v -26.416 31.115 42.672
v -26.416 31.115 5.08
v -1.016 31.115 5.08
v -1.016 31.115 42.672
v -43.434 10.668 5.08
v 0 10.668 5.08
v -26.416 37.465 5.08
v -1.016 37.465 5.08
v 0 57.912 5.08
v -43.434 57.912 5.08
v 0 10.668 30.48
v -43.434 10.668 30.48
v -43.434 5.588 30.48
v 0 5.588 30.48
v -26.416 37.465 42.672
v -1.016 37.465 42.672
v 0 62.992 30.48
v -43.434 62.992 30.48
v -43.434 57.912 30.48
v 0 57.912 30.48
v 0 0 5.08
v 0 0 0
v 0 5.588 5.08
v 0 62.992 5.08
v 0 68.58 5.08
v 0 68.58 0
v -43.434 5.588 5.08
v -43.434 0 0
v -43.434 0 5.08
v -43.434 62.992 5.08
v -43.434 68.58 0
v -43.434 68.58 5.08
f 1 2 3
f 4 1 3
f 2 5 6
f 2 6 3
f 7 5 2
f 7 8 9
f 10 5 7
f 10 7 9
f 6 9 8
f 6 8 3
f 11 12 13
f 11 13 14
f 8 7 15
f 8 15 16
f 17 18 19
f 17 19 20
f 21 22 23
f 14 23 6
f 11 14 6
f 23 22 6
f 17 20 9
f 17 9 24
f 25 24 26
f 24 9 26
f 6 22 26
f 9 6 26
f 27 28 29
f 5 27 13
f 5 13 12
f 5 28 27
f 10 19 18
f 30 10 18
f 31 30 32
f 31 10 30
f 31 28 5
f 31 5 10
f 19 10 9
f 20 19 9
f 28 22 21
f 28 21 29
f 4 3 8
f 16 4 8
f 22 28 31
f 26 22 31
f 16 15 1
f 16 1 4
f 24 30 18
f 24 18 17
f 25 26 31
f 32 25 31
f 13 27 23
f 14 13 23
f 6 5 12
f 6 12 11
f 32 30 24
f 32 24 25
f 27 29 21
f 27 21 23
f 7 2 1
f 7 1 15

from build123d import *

# Parameters (mm, degrees)
SKETCH1_W           = 68.58
SKETCH1_H           = 43.434
BOSS_EXTRUDE1_DEPTH = 5.08
SKETCH2_W           = 43.434
SKETCH2_H           = 5.08
BOSS_EXTRUDE2_DEPTH = 25.4
SKETCH3_W           = 25.4
SKETCH3_H           = 6.35
BOSS_EXTRUDE3_DEPTH = 37.592


with BuildPart() as part:
    # Sketch1 → Boss-Extrude1 (new body)
    with BuildSketch(Plane(origin=(0, 0, 0), x_dir=(0, 1, 0), z_dir=(0, 0, 1))):
        with Locations((34.29, 21.717)):
            Rectangle(SKETCH1_W, SKETCH1_H)
    extrude(amount=BOSS_EXTRUDE1_DEPTH)

    # Sketch2 → Boss-Extrude2 (add)
    with BuildSketch(Plane.XY.offset(5.08)):
        with Locations((-21.717, 8.128)):
            Rectangle(SKETCH2_W, SKETCH2_H)
        with Locations((-21.717, 60.452)):
            Rectangle(SKETCH2_W, SKETCH2_H)
    extrude(amount=BOSS_EXTRUDE2_DEPTH)

    # Sketch3 → Boss-Extrude3 (add)
    with BuildSketch(Plane.XY.offset(5.08)):
        with Locations((-13.716, 34.29)):
            Rectangle(SKETCH3_W, SKETCH3_H)
    extrude(amount=BOSS_EXTRUDE3_DEPTH)


solid = part.part
